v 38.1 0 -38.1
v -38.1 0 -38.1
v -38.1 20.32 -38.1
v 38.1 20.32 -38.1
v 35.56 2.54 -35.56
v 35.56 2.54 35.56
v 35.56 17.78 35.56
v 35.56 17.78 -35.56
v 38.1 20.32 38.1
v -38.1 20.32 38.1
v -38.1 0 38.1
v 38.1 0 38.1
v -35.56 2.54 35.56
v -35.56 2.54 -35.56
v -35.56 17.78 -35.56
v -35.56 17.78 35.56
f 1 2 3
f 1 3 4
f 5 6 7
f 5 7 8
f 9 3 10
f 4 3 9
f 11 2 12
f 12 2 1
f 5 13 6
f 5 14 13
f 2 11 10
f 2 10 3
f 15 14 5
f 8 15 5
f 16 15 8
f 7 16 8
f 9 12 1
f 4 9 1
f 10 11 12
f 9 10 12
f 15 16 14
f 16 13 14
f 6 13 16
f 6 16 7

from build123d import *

# Parameters (mm, degrees)
SKETCH1_W           = 76.2
SKETCH1_H           = 76.2
BOSS_EXTRUDE3_DEPTH = 20.32
SHELL3_T            = 2.54


with BuildPart() as part:
    # Sketch1 → Boss-Extrude3 (new body)
    with BuildSketch(Plane(origin=(0, 0, 0), x_dir=(1, 0, 0), z_dir=(0, 1, 0))):
        Rectangle(SKETCH1_W, SKETCH1_H)
    extrude(amount=BOSS_EXTRUDE3_DEPTH)

    # Shell3 (no face opened: a closed hollow body)
    add(offset(amount=-SHELL3_T, mode=Mode.PRIVATE), mode=Mode.SUBTRACT)


solid = part.part
